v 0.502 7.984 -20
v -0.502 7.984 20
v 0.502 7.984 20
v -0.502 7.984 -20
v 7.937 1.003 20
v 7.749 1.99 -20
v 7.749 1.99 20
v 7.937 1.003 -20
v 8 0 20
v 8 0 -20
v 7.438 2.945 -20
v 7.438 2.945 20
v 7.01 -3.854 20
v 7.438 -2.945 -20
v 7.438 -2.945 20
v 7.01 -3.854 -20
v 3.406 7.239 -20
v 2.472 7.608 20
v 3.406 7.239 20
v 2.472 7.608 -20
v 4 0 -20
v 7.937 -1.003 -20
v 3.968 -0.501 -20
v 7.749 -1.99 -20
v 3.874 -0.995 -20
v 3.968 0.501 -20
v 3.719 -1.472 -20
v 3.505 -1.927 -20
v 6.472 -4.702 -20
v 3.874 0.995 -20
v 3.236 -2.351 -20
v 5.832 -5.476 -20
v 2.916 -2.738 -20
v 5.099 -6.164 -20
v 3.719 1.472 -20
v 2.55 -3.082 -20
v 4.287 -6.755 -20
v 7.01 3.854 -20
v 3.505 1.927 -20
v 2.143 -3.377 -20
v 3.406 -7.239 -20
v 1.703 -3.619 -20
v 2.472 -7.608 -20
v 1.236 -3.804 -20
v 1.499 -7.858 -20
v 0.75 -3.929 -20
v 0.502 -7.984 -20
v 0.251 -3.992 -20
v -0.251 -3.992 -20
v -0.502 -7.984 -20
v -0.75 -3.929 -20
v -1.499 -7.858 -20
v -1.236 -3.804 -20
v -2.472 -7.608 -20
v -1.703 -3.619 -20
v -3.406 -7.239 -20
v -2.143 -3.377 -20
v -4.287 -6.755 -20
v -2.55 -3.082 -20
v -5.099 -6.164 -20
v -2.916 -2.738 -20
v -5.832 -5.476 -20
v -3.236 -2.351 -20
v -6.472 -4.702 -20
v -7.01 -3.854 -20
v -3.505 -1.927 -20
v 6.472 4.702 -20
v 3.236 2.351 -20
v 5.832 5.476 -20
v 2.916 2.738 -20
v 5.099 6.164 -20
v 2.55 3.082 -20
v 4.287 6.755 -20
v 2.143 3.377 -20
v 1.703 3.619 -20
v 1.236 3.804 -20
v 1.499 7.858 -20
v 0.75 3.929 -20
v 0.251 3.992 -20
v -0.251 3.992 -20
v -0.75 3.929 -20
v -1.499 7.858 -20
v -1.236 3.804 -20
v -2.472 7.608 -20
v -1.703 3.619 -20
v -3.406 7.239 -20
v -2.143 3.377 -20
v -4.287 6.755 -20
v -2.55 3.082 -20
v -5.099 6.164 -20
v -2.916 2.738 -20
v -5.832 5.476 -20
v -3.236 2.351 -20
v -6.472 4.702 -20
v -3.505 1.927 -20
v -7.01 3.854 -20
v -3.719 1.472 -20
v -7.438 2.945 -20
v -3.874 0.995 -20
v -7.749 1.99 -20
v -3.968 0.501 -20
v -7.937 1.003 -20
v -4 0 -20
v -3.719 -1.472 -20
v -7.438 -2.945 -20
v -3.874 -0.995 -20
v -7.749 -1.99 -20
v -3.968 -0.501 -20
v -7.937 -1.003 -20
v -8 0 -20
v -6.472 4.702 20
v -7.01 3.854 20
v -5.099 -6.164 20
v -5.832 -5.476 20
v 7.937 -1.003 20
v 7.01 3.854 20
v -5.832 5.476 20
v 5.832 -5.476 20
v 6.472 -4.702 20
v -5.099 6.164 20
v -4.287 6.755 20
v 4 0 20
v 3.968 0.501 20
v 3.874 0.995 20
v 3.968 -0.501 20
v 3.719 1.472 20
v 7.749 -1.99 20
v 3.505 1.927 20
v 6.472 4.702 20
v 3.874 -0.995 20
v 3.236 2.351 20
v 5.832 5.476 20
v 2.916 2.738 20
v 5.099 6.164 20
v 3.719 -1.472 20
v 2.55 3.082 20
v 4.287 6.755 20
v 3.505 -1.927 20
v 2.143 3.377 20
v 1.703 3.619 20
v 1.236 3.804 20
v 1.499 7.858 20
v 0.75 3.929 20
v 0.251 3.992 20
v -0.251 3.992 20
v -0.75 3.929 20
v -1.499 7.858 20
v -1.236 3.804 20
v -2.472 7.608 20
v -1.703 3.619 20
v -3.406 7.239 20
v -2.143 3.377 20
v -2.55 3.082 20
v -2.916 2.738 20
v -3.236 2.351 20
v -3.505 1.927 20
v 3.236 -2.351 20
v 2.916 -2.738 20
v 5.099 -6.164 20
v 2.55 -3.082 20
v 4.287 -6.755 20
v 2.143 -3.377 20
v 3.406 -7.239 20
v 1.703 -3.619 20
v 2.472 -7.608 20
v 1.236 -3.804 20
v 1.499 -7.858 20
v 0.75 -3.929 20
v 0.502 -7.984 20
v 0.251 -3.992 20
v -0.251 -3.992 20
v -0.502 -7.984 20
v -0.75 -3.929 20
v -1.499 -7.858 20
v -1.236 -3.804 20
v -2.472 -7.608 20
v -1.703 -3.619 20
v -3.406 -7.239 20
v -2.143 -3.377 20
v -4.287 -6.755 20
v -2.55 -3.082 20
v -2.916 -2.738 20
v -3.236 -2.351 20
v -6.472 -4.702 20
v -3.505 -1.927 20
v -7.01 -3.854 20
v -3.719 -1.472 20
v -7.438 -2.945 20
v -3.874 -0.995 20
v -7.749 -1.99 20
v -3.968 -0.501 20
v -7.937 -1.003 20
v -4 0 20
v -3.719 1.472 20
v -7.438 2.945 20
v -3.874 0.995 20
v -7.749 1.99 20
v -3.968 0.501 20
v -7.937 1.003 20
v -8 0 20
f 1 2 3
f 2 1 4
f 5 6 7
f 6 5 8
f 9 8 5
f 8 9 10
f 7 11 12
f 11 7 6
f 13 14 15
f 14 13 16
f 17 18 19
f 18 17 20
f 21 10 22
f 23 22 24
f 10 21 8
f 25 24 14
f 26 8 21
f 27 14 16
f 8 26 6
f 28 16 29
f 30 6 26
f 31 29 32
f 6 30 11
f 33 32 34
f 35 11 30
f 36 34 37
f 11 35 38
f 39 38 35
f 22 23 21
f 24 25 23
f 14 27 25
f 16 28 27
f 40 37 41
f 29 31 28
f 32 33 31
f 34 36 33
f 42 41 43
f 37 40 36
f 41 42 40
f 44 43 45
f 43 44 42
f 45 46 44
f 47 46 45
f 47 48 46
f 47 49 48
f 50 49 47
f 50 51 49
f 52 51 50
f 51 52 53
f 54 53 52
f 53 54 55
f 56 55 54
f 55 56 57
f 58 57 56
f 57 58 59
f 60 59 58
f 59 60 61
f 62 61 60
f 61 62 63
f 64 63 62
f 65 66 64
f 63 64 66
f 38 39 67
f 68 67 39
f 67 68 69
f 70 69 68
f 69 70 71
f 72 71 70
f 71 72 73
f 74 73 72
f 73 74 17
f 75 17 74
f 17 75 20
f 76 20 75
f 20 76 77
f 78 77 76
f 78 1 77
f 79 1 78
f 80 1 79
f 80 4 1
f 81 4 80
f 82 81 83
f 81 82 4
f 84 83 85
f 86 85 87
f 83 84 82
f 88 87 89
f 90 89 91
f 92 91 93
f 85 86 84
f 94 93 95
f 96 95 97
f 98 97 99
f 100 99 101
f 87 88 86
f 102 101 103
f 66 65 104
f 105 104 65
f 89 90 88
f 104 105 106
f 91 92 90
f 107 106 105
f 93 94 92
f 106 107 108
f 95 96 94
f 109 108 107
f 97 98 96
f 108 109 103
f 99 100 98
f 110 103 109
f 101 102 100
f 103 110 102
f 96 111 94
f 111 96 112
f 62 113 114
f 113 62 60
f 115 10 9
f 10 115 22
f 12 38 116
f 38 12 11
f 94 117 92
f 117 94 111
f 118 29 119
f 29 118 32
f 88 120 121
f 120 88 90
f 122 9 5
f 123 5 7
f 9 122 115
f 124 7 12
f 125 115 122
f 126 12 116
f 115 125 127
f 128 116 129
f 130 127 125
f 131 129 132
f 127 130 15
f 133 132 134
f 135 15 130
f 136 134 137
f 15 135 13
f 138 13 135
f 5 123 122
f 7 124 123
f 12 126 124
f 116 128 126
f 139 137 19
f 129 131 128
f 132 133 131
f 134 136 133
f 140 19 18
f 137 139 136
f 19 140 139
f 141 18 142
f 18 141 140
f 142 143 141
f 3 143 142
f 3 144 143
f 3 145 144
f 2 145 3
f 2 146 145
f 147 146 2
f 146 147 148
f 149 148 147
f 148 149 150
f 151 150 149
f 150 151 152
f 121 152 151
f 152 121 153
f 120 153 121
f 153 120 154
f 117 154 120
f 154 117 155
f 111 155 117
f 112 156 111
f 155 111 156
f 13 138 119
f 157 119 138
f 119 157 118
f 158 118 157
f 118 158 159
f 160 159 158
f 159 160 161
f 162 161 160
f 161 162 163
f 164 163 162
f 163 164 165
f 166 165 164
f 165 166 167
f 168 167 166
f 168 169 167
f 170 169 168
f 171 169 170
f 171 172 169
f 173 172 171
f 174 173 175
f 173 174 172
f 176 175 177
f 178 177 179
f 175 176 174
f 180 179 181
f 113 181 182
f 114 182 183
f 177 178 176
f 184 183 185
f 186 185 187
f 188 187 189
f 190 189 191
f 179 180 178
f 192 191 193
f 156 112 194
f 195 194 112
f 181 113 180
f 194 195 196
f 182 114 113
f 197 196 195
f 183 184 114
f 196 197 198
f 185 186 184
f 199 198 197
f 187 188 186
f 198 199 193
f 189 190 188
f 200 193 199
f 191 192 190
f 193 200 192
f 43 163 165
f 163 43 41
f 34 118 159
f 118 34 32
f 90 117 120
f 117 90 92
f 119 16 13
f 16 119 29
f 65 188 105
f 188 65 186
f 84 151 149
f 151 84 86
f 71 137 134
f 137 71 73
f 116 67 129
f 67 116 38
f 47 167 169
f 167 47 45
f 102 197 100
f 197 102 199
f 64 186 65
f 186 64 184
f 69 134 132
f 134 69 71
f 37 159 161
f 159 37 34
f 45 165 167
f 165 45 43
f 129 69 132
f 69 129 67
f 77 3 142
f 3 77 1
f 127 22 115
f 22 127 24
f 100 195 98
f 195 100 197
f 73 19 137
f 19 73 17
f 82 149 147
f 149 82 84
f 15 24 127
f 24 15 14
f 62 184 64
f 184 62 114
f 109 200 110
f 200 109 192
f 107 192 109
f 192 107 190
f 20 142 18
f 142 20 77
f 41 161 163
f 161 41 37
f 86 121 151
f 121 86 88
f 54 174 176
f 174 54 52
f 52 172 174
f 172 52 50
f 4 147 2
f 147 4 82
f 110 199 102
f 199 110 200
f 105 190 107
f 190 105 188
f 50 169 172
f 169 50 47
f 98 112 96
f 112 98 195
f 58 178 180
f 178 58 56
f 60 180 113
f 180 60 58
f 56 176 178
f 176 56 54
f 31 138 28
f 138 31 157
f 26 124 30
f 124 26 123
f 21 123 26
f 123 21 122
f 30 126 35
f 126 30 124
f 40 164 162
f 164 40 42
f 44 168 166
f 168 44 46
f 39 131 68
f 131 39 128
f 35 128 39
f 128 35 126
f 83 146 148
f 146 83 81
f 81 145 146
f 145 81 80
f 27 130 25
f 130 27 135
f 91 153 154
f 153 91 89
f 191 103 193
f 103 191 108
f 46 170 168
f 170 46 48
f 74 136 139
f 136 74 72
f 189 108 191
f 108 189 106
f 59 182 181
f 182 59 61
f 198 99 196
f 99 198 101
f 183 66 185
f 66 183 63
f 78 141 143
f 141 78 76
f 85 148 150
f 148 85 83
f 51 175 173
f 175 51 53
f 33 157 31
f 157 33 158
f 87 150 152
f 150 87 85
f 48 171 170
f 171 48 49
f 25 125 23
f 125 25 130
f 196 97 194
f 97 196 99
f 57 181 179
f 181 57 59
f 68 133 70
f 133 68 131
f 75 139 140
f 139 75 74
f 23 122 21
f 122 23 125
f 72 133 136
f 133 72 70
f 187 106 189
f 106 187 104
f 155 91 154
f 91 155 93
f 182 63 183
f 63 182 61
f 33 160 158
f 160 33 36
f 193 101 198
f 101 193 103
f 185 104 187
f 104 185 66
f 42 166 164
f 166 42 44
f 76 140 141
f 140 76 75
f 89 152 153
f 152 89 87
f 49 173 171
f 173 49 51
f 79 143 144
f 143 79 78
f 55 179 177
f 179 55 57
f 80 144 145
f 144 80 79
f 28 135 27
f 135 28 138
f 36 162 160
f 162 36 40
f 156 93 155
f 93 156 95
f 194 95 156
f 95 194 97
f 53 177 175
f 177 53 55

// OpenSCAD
$fn = 50;


difference() {
	union() {
		translate(v = [0, 0, -20.0000000000]) {
			cylinder(h = 40, r = 8.0000000000);
		}
	}
	union() {
		translate(v = [0, 0, -100.0000000000]) {
			cylinder(h = 200, r = 4.0000000000);
		}
	}
}
